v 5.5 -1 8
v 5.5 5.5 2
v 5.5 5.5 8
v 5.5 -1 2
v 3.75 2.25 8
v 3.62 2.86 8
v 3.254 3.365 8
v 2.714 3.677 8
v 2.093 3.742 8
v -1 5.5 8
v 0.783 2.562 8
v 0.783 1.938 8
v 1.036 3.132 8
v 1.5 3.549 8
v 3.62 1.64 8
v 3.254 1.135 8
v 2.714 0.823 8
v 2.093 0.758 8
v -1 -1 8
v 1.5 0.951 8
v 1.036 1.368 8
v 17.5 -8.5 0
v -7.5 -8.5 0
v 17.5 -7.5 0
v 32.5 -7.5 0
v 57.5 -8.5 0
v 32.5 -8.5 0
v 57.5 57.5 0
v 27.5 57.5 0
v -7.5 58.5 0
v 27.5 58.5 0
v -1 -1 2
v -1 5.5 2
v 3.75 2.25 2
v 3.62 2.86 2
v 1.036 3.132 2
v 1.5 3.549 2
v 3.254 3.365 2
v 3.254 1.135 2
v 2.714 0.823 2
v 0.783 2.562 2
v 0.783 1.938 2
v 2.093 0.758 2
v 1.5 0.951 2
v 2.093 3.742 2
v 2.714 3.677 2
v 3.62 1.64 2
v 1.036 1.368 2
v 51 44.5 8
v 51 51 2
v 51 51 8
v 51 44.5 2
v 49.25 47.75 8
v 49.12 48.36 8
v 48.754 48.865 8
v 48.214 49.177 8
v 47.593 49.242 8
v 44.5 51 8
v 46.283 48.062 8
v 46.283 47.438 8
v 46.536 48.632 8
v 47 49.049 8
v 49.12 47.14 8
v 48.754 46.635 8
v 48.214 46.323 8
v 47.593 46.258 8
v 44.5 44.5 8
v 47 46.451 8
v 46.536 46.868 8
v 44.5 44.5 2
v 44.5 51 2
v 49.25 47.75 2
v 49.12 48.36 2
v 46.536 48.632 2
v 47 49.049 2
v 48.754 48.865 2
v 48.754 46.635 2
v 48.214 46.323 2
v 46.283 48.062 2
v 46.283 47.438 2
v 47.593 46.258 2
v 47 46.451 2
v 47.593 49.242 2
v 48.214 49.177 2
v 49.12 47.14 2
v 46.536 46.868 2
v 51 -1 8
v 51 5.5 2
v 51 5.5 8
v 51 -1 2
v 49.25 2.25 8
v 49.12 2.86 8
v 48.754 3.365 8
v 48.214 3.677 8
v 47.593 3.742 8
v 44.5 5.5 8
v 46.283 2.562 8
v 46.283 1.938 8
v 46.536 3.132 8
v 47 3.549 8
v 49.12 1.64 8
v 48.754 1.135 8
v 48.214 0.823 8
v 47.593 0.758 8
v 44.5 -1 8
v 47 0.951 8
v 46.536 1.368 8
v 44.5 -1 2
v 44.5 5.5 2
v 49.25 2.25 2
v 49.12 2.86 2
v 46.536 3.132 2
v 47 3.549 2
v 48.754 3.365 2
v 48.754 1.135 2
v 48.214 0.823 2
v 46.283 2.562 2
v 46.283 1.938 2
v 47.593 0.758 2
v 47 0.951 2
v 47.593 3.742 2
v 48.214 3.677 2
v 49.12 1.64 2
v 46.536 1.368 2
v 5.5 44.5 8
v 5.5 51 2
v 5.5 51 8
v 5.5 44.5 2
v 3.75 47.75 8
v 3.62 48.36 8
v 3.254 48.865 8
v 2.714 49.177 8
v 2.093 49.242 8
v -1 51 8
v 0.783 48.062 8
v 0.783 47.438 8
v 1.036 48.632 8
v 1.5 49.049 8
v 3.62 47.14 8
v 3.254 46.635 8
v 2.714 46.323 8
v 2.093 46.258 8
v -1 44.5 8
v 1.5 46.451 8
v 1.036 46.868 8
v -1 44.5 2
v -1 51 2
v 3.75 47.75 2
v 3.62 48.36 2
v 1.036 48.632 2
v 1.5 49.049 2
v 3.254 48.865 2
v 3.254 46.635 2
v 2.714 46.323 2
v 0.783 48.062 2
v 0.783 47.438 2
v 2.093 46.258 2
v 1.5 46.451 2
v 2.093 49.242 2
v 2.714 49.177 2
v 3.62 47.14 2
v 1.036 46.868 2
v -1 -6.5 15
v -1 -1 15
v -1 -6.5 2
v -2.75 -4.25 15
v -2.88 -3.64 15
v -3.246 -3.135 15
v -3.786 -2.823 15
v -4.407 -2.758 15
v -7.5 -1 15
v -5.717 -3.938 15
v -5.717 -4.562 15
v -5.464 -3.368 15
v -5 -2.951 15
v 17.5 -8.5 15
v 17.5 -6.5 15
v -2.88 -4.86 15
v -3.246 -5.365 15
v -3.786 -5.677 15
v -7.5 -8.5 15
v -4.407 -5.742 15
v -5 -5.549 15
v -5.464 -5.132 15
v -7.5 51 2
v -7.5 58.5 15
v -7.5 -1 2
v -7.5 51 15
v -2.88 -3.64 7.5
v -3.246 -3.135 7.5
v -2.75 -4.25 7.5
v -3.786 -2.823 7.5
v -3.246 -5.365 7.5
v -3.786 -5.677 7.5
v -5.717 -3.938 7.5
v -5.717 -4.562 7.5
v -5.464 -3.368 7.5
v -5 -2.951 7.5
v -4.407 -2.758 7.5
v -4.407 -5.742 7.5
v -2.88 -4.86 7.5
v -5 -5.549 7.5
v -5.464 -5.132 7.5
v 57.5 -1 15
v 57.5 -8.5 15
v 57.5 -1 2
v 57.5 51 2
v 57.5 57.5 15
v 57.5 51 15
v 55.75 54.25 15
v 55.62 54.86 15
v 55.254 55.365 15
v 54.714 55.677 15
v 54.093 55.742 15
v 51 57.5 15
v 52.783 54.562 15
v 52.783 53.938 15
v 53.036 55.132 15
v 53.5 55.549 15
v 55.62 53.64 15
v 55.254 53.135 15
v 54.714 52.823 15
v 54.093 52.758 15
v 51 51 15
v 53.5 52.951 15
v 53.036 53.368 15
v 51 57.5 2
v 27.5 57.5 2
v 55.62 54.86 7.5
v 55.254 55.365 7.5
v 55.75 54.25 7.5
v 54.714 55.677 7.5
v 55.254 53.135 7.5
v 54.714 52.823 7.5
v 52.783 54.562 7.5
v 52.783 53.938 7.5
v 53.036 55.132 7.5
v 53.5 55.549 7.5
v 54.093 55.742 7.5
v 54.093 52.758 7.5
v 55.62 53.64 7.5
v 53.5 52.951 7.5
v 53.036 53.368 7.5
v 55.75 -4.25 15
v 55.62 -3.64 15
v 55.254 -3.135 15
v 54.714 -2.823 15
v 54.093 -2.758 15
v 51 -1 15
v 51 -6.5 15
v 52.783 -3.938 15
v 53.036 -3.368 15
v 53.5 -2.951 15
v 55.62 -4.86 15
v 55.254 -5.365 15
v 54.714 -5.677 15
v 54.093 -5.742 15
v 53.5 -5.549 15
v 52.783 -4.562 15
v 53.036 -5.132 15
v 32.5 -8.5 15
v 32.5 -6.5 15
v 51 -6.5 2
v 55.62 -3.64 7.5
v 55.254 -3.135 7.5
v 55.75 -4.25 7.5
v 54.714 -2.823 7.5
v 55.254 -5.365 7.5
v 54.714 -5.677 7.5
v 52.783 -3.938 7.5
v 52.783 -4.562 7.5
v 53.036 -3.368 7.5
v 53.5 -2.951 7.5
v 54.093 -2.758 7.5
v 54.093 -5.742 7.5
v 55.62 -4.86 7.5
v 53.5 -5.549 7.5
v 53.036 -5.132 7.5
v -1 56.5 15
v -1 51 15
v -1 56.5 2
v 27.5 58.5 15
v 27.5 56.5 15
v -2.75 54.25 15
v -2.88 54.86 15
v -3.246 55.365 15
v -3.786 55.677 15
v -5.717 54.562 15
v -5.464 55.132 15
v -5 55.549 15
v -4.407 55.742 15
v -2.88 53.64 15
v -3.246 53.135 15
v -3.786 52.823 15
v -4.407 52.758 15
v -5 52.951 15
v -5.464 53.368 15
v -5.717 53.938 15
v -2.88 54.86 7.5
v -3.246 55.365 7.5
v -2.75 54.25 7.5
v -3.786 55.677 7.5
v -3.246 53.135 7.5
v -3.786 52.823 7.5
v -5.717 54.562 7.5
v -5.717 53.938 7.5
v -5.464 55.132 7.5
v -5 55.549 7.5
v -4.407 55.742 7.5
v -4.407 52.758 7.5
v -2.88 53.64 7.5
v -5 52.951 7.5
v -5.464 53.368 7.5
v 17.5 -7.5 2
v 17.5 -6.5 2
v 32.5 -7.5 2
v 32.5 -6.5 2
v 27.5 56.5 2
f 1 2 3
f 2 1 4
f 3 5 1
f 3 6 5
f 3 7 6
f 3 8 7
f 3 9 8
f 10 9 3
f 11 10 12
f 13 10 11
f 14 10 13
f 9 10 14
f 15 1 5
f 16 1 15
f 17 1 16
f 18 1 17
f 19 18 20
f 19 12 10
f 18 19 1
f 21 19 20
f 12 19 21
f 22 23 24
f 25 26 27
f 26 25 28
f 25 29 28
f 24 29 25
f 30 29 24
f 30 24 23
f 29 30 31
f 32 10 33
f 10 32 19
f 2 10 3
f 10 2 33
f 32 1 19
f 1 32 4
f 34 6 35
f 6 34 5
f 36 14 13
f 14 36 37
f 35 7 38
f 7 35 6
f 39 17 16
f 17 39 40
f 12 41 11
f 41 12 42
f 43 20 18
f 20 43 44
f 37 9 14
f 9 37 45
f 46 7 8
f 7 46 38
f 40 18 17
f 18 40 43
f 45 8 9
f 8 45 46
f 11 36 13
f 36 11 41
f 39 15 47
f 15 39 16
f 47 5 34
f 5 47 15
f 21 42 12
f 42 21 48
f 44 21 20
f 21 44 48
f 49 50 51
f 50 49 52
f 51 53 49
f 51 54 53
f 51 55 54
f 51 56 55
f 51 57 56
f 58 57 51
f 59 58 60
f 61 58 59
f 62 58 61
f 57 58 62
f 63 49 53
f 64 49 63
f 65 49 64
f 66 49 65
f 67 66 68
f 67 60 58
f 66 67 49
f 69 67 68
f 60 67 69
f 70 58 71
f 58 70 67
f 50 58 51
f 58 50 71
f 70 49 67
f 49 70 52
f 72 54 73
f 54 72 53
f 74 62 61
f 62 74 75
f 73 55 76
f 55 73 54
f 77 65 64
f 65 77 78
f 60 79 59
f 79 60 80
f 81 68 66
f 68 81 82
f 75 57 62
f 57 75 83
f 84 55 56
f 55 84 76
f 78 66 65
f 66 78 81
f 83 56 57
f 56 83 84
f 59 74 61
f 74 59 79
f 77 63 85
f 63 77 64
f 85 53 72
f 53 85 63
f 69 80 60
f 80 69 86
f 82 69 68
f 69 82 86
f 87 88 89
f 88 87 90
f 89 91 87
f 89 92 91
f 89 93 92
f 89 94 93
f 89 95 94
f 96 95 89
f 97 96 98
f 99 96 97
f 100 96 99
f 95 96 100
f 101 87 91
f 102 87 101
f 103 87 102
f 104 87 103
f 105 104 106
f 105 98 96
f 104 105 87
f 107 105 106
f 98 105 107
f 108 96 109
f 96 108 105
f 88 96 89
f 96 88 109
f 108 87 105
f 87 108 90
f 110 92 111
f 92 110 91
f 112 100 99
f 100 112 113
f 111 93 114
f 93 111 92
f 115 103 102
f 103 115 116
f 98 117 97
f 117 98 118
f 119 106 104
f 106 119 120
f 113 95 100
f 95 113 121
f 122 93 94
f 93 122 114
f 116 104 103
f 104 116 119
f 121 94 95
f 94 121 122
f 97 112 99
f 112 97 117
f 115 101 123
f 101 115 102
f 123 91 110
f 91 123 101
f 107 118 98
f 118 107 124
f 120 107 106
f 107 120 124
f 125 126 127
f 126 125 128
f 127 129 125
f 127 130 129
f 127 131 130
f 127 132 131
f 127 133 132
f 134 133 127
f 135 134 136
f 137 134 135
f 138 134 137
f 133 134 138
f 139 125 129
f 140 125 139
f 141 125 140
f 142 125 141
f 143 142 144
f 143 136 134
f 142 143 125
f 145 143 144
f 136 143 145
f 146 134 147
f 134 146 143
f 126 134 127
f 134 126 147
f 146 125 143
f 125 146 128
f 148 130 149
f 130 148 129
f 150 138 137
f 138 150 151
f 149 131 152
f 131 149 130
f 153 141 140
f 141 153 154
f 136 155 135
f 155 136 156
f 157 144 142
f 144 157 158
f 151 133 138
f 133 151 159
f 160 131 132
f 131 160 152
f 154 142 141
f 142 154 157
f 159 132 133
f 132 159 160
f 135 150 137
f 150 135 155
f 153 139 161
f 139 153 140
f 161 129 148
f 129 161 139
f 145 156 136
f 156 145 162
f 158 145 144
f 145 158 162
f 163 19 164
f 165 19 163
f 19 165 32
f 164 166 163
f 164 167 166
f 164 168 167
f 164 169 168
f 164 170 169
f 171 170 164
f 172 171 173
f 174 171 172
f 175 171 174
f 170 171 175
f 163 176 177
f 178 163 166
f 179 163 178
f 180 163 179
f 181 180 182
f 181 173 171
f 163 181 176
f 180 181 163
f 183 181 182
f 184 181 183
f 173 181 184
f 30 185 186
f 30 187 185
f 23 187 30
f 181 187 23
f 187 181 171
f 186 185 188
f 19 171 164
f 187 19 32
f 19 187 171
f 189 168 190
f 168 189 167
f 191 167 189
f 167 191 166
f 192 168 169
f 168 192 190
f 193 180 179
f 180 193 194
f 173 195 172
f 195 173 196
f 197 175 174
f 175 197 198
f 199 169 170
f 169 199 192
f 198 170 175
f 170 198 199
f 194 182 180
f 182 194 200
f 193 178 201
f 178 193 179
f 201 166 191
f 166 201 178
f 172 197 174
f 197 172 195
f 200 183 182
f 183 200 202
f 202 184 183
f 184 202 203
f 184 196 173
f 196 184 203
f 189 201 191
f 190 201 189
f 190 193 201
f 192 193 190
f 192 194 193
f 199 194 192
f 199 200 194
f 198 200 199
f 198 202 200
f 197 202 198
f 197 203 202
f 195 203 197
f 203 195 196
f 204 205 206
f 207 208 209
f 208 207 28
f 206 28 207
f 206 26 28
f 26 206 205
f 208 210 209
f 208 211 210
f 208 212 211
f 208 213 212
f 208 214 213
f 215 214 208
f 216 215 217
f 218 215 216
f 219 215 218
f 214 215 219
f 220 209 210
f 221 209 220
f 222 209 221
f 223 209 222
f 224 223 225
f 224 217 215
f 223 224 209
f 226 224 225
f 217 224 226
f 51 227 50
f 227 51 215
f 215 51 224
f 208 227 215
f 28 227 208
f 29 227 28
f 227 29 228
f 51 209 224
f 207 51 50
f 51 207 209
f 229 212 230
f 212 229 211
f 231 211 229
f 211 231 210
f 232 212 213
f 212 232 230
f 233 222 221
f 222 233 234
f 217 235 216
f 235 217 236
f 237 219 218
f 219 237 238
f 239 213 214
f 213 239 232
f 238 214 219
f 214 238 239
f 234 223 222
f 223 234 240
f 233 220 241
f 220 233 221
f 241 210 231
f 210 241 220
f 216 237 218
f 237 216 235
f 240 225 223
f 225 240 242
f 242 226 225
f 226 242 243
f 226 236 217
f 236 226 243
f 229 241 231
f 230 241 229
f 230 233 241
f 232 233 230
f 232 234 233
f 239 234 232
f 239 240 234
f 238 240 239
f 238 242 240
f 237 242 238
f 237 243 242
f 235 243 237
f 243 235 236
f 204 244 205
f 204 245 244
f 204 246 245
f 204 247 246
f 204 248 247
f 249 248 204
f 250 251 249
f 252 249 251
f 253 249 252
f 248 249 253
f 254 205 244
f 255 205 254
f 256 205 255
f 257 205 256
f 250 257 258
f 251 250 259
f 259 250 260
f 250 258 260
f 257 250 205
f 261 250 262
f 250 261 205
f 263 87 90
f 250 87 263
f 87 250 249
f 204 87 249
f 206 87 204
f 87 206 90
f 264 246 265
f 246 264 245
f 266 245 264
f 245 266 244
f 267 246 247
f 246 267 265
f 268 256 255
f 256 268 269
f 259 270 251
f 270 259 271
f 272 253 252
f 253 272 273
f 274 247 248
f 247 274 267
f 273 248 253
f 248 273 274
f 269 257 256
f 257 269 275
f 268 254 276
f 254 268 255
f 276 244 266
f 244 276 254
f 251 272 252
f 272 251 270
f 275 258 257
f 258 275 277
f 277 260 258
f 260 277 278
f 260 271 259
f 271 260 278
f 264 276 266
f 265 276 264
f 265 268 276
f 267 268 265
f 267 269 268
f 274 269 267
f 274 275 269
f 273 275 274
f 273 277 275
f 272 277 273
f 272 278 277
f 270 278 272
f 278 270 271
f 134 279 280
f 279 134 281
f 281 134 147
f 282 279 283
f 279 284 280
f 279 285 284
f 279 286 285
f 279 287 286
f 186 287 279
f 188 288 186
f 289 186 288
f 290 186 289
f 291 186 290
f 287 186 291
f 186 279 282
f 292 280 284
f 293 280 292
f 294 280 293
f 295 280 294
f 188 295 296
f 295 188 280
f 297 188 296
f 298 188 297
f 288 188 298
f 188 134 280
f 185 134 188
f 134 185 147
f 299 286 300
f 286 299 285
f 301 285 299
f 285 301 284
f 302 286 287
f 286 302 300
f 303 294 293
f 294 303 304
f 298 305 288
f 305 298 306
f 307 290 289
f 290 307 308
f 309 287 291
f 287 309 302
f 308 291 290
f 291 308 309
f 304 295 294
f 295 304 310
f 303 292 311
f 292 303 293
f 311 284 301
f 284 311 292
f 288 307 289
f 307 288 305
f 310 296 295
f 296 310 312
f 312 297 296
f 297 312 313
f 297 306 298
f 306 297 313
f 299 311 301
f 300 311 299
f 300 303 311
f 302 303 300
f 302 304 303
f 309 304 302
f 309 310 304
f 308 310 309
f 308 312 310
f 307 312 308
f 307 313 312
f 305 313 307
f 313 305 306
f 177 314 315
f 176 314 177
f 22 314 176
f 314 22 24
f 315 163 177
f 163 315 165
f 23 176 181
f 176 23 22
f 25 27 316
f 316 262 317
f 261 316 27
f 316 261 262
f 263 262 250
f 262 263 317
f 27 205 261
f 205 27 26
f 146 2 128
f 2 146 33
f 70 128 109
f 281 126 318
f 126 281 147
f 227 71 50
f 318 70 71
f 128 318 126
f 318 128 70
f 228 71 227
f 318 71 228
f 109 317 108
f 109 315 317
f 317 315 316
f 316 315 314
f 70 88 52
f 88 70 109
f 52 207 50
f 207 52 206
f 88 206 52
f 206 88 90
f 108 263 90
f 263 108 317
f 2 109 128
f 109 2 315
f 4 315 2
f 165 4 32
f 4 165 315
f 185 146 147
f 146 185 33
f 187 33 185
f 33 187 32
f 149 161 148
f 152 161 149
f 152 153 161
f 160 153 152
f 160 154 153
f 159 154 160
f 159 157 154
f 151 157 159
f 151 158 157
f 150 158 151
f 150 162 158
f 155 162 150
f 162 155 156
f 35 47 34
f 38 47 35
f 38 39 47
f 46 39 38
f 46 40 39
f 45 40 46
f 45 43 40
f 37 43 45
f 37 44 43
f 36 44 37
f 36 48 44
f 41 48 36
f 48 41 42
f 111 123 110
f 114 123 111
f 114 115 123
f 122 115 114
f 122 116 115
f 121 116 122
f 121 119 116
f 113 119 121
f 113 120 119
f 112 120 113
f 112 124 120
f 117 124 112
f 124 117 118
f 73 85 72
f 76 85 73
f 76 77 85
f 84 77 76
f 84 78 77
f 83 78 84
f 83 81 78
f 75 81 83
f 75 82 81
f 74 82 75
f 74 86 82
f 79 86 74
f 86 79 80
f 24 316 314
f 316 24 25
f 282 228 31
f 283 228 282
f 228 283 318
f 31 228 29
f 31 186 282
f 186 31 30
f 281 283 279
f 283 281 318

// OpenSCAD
bottom_thickness = 2;
board_X = 50;
board_Y = 50;
standoff_offset=1.0;
heat_set_insert_dim_xy = 6.5;

chassis_board_dim = [board_X+(standoff_offset*2)+(heat_set_insert_dim_xy*2),board_Y+(standoff_offset*2)+(heat_set_insert_dim_xy*2),bottom_thickness];

module standoff_holder(xyz=[0,0,0]) {
    insert_height = 10;
    bottom_thickness = 2;
    cube_dim = [6,6];
    standoff_r = 1.4;

    translate([xyz[0], xyz[1], xyz[2]+bottom_thickness]){
    difference(){
    translate([0,0,-bottom_thickness + (insert_height + bottom_thickness)/2]){
        cube([cube_dim[0],cube_dim[1],insert_height+bottom_thickness],center=true);
    }

    cylinder(20,standoff_r ,standoff_r ,$fn=100);
    }
    }
}

module heat_set_insert(translate_pos = [0,0,0], insert_xy_dim = [heat_set_insert_dim_xy,heat_set_insert_dim_xy], insert_height = 8, hole_r=1.5, hole_h=7.5, cylinder_fn = 15){
    insert_width = insert_xy_dim[0];
    insert_depth = insert_xy_dim[1];
    insert_height = insert_height;
    
    translate(translate_pos){
        difference(){
        cube([insert_width,insert_depth,insert_height]);
            translate([insert_width/2,insert_depth/2,insert_height - hole_h]){
                cylinder(hole_h+1,hole_r,hole_r, $fn=cylinder_fn);
            }
        }
    }
}


translate([-standoff_offset-heat_set_insert_dim_xy,-standoff_offset-heat_set_insert_dim_xy,0]){
    cube(chassis_board_dim);
}

heat_set_insert(translate_pos=[0-standoff_offset,0-standoff_offset,0]);
heat_set_insert(translate_pos=[50-heat_set_insert_dim_xy+standoff_offset,50-heat_set_insert_dim_xy+standoff_offset,0]);
heat_set_insert(translate_pos=[50-heat_set_insert_dim_xy+standoff_offset,0-standoff_offset,0]);
heat_set_insert(translate_pos=[0-standoff_offset,50-heat_set_insert_dim_xy+standoff_offset,0]);
    

wall_height = 15;

heat_set_insert(translate_pos=[0-standoff_offset-heat_set_insert_dim_xy ,0-standoff_offset-heat_set_insert_dim_xy ,0], insert_height=wall_height);
heat_set_insert(translate_pos=[50-heat_set_insert_dim_xy+standoff_offset+heat_set_insert_dim_xy,50-heat_set_insert_dim_xy+standoff_offset+heat_set_insert_dim_xy,0], insert_height=wall_height);
heat_set_insert(translate_pos=[50-heat_set_insert_dim_xy+standoff_offset+heat_set_insert_dim_xy,0-standoff_offset-heat_set_insert_dim_xy,0], insert_height=wall_height);
heat_set_insert(translate_pos=[0-standoff_offset-heat_set_insert_dim_xy,50-heat_set_insert_dim_xy+standoff_offset+heat_set_insert_dim_xy,0], insert_height=wall_height);

translate([-standoff_offset-heat_set_insert_dim_xy,-standoff_offset-heat_set_insert_dim_xy-1,0]){
cube([25,2,wall_height]);
translate([40,0,0]){
cube([25,2,wall_height]);
}
}

translate([-standoff_offset-heat_set_insert_dim_xy,-standoff_offset-heat_set_insert_dim_xy+chassis_board_dim[1]-1,0]){
cube([35,2,wall_height]);
}
